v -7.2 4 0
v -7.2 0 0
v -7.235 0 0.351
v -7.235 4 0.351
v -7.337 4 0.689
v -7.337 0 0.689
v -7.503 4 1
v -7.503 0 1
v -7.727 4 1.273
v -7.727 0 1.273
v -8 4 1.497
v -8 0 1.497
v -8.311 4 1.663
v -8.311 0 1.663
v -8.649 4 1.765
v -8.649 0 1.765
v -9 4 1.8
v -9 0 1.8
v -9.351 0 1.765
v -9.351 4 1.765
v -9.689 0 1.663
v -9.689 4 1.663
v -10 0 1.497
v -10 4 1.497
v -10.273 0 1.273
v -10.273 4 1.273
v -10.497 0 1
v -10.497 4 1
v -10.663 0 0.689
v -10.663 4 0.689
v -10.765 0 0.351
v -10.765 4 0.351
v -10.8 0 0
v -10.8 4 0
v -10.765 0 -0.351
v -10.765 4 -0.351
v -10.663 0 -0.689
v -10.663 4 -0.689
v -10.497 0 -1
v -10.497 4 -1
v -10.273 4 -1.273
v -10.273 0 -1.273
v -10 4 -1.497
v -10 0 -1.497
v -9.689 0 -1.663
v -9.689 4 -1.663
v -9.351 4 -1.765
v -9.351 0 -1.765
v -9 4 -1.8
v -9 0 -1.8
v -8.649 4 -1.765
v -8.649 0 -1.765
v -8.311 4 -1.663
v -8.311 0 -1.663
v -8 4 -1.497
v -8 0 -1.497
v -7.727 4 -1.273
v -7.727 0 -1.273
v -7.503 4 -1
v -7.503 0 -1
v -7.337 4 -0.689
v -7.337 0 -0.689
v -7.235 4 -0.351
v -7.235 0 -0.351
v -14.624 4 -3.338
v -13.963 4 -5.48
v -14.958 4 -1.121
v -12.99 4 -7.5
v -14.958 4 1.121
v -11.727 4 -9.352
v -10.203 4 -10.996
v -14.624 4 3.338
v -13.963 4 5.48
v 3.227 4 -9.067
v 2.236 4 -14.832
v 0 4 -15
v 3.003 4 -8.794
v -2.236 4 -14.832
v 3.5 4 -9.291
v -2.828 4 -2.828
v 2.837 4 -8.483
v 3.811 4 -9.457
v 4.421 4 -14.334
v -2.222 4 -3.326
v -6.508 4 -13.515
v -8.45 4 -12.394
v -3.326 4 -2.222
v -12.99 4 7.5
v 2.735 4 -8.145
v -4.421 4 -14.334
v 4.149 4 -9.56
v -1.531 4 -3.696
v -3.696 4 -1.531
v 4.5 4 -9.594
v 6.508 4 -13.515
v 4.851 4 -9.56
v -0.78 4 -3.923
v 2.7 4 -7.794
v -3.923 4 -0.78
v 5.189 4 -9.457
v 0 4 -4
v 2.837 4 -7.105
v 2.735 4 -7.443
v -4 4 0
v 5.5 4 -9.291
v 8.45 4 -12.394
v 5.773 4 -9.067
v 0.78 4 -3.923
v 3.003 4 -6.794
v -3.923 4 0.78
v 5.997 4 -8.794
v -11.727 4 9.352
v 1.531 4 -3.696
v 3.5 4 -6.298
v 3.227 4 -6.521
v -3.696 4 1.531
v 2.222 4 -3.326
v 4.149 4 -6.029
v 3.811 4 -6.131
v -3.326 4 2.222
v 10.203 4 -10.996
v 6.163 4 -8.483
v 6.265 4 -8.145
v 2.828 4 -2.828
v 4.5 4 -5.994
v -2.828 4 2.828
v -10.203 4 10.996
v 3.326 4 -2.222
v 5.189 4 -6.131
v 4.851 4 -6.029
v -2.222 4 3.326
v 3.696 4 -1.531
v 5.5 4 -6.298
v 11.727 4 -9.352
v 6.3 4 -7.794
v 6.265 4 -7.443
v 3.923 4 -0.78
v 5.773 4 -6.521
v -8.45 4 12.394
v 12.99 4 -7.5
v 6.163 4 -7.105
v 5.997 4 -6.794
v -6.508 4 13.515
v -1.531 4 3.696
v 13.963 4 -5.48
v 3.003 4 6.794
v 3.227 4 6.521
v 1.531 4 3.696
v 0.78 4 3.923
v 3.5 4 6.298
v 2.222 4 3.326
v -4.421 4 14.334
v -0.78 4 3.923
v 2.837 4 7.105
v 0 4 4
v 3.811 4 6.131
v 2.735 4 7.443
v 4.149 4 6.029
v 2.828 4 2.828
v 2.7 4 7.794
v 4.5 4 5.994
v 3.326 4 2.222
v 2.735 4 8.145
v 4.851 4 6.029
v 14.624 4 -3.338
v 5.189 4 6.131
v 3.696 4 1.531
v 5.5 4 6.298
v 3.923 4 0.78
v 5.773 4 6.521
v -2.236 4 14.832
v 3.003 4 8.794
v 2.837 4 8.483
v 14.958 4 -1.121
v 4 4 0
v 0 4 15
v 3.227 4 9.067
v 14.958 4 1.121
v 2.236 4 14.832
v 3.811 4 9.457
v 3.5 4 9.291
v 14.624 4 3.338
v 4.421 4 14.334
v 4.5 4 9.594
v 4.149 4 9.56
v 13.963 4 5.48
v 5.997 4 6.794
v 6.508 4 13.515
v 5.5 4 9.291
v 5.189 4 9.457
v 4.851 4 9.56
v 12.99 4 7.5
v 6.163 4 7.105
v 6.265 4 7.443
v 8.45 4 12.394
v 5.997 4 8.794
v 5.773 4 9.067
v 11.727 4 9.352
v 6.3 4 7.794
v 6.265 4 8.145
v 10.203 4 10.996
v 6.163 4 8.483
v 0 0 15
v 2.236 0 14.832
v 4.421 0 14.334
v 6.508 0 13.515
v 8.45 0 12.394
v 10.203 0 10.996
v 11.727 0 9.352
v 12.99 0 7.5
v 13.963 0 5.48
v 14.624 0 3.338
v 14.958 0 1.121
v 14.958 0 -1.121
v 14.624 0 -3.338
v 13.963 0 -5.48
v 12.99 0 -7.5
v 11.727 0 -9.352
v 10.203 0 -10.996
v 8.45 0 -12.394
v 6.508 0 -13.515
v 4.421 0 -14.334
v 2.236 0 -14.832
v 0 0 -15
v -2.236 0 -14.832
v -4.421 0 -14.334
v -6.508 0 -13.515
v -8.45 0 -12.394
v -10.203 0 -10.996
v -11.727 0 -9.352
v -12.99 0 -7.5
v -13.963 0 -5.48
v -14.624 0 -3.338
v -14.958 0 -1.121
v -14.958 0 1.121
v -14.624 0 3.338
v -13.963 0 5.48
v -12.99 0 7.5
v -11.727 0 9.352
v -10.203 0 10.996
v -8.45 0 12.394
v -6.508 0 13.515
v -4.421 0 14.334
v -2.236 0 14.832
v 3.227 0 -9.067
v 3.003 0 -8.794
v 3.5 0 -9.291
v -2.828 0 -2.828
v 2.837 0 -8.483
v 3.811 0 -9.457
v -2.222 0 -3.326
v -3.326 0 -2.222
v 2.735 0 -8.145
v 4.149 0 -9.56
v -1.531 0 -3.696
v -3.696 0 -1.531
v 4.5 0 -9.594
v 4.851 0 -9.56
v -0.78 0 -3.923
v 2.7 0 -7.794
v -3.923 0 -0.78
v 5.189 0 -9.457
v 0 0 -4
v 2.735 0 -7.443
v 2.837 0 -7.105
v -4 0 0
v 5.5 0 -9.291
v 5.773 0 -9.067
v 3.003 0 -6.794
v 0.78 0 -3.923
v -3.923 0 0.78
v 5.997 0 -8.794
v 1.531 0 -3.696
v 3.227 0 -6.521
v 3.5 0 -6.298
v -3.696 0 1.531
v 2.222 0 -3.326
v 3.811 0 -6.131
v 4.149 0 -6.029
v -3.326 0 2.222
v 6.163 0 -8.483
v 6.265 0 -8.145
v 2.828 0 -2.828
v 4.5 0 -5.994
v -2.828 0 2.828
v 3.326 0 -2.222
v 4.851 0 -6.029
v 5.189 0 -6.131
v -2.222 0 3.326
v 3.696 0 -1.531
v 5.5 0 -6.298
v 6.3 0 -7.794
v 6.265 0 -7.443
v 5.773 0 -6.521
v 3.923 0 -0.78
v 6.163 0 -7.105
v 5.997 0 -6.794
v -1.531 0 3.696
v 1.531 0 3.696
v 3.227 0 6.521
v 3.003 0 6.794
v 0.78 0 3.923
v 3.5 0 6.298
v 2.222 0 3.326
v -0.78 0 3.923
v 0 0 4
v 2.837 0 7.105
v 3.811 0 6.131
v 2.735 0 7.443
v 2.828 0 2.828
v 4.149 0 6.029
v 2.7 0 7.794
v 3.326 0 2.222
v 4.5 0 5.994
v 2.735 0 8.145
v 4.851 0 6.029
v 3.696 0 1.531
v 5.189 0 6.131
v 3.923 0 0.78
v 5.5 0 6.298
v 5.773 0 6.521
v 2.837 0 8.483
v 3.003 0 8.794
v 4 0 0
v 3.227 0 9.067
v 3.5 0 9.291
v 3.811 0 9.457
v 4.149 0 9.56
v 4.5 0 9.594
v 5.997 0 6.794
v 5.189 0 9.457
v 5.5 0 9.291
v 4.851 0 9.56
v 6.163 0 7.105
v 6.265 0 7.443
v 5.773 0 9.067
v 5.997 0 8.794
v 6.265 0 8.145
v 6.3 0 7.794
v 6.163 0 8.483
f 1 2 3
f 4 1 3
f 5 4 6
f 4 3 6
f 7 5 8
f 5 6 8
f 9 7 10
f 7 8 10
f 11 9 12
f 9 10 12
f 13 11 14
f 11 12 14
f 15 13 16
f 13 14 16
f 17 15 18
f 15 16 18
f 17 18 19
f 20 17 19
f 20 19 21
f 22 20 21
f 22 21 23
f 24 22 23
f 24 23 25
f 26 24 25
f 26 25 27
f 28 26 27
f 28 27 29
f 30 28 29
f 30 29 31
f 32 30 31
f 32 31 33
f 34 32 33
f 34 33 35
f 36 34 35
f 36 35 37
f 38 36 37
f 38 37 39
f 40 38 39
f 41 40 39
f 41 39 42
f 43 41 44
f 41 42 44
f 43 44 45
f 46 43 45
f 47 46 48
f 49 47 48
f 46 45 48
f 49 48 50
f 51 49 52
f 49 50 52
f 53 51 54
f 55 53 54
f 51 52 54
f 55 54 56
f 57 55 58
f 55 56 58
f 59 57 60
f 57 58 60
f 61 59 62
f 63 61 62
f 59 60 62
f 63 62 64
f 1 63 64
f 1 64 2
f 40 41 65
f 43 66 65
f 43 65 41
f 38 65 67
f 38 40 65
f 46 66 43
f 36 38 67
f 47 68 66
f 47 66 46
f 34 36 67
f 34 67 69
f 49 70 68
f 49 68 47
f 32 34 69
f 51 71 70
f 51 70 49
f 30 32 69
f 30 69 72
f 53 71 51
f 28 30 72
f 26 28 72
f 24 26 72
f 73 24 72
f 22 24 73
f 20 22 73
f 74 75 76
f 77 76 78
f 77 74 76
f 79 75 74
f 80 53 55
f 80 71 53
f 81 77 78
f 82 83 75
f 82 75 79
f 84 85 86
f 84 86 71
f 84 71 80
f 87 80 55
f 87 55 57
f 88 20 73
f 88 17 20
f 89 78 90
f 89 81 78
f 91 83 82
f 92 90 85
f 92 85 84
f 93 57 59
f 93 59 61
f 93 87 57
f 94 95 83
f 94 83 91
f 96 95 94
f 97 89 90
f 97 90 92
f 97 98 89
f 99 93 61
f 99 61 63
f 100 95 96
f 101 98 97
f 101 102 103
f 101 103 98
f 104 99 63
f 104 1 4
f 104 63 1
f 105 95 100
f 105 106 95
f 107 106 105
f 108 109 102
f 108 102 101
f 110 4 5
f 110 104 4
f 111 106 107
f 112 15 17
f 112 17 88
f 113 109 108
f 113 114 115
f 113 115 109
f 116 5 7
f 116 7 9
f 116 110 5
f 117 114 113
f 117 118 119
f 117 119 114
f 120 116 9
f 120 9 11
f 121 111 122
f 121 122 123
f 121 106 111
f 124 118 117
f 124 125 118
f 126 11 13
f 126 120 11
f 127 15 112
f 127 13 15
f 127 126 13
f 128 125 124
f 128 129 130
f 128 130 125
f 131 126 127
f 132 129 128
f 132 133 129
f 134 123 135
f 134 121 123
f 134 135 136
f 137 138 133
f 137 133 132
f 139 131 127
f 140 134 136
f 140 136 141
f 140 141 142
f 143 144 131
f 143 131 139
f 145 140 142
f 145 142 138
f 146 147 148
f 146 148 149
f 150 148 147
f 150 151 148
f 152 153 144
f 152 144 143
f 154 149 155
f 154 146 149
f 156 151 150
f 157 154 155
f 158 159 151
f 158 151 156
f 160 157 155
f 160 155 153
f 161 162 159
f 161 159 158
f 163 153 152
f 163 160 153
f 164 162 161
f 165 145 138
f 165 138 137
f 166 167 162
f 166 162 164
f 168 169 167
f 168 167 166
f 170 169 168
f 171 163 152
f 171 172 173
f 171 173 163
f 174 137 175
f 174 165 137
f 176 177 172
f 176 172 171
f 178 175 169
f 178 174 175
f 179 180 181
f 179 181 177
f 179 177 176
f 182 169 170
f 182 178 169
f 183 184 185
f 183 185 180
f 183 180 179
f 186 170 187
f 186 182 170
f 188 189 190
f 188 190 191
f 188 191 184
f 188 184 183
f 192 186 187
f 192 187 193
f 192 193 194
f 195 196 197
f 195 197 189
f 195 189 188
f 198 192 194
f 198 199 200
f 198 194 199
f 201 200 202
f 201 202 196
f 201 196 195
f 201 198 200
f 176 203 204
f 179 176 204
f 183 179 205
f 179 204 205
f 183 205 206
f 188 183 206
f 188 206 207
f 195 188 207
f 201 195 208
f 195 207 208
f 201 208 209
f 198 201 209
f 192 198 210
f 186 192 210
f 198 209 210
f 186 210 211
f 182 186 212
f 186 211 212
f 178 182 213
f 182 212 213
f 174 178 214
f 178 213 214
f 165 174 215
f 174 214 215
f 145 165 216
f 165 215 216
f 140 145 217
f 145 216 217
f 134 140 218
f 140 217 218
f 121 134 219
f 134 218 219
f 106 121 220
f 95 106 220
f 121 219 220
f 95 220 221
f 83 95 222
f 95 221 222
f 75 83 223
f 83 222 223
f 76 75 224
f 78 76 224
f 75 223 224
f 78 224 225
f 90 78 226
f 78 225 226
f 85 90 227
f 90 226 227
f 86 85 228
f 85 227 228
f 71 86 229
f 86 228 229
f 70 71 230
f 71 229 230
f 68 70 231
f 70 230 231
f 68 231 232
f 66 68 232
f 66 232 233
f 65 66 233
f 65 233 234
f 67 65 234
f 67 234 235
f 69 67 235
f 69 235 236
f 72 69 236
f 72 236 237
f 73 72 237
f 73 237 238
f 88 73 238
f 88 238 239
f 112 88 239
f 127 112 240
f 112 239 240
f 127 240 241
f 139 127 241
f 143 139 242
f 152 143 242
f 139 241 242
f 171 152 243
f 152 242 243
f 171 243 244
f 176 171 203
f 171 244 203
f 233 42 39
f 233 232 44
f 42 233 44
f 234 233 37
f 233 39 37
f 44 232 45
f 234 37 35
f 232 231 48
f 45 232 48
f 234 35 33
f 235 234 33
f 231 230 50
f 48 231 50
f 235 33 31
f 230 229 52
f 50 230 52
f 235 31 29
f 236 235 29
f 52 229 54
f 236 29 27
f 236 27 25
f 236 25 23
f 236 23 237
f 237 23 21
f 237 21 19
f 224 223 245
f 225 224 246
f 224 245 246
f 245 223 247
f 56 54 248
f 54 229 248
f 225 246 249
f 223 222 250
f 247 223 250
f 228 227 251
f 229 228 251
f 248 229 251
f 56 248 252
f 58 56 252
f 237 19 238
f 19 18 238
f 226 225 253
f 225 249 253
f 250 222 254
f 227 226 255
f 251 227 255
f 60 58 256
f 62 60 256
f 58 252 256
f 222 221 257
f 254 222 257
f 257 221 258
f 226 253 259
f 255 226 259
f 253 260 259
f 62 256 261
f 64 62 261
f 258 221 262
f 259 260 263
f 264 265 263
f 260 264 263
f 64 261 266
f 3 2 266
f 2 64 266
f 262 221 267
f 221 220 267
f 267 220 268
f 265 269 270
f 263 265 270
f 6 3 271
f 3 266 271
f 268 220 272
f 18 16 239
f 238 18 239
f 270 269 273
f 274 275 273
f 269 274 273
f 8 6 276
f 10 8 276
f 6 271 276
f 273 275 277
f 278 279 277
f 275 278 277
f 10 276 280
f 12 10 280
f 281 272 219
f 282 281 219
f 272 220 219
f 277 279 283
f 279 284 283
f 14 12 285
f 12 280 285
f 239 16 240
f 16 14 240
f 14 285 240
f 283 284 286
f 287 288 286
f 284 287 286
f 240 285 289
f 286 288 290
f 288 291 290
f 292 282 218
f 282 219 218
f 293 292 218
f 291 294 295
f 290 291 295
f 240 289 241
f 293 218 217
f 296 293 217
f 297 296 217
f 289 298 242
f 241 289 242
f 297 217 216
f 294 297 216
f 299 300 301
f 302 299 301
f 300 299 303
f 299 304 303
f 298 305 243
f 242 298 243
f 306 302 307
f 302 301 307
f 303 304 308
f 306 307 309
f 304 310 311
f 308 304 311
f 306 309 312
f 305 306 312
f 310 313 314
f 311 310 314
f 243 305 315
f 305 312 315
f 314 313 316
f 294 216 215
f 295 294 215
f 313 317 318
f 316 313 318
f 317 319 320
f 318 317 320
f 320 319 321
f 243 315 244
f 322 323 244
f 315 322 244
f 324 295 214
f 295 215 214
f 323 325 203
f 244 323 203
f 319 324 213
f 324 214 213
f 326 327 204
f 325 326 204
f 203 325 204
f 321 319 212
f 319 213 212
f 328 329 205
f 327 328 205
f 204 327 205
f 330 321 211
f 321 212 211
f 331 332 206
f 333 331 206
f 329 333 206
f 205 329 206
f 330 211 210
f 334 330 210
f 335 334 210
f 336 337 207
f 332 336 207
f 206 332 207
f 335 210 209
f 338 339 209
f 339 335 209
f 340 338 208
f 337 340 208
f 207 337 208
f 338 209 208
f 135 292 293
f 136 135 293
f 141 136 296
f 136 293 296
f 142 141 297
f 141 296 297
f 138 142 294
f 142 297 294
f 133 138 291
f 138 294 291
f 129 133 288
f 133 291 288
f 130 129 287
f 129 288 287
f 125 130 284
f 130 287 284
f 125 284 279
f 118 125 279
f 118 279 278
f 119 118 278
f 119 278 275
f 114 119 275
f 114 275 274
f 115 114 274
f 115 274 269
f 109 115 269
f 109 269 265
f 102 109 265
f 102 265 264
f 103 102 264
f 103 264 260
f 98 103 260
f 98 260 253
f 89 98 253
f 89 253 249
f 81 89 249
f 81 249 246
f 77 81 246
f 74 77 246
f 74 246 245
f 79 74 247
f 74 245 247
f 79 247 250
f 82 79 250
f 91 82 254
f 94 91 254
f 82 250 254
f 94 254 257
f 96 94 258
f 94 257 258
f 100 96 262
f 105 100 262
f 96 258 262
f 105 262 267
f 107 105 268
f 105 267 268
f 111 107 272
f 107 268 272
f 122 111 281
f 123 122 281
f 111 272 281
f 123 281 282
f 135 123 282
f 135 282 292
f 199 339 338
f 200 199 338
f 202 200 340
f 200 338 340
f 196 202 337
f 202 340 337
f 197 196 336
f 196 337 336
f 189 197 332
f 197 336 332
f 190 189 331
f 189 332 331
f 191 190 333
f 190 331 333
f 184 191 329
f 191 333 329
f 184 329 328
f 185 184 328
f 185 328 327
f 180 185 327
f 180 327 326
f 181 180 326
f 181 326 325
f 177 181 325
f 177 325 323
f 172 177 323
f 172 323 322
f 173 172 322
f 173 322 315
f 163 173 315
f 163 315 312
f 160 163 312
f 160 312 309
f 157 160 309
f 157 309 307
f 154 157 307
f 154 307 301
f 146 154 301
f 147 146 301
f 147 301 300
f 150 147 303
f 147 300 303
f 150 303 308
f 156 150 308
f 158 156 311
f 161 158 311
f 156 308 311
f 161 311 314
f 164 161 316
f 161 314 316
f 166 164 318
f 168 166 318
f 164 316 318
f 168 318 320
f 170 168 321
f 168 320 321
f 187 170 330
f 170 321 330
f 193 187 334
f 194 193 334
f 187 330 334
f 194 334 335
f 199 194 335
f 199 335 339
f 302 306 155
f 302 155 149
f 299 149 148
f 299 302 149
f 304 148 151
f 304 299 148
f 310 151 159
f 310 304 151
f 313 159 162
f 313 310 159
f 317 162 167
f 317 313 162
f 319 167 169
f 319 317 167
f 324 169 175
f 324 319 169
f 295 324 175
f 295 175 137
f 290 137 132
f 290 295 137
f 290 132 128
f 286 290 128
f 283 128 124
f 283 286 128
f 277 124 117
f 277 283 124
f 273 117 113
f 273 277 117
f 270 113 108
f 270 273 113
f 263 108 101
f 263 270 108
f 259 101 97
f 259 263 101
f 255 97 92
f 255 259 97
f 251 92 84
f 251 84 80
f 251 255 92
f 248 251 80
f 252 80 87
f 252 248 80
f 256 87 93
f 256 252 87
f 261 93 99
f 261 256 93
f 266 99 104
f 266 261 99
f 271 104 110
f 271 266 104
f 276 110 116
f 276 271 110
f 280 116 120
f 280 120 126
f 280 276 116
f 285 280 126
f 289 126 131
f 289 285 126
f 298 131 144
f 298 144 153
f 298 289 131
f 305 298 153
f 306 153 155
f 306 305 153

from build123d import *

# Parameters (mm, degrees)
CROQUIS1_R                       = 15
CROQUIS1_R_2                     = 4
SALIENTE_EXTRUIR1_DEPTH          = 4
TALADRO_DE_MARGEN_PARA_M31_D     = 3.6
TALADRO_DE_MARGEN_PARA_M31_DEPTH = 5
TALADRO_DE_MARGEN_PARA_M31_TIP   = 1.081549114


with BuildPart() as part:
    # Croquis1 → Saliente-Extruir1 (new body)
    with BuildSketch(Plane(origin=(0, 0, 0), x_dir=(-1, 0, 0), z_dir=(0, 1, 0))):
        with Locations(Location((0, 0, 0), (0, 0, 90))):
            Circle(CROQUIS1_R)
        with Locations(Location((0, 0, 0), (0, 0, 90))):
            Circle(CROQUIS1_R_2, mode=Mode.SUBTRACT)
    extrude(amount=SALIENTE_EXTRUIR1_DEPTH)

    # Taladro de margen para M31
    with Locations(Plane(origin=(0, 4, 0), x_dir=(-1, 0, 0), z_dir=(0, 1, 0))):
        with Locations((-4.5, 7.794228634), (9, 0), (-4.5, -7.794228634), (0, 0)):
            Hole(TALADRO_DE_MARGEN_PARA_M31_D / 2, depth=TALADRO_DE_MARGEN_PARA_M31_DEPTH)
            with Locations((0, 0, -(TALADRO_DE_MARGEN_PARA_M31_DEPTH + TALADRO_DE_MARGEN_PARA_M31_TIP / 2))):  # 118° drill point
                Cone(0, TALADRO_DE_MARGEN_PARA_M31_D / 2, TALADRO_DE_MARGEN_PARA_M31_TIP, mode=Mode.SUBTRACT)


solid = part.part
